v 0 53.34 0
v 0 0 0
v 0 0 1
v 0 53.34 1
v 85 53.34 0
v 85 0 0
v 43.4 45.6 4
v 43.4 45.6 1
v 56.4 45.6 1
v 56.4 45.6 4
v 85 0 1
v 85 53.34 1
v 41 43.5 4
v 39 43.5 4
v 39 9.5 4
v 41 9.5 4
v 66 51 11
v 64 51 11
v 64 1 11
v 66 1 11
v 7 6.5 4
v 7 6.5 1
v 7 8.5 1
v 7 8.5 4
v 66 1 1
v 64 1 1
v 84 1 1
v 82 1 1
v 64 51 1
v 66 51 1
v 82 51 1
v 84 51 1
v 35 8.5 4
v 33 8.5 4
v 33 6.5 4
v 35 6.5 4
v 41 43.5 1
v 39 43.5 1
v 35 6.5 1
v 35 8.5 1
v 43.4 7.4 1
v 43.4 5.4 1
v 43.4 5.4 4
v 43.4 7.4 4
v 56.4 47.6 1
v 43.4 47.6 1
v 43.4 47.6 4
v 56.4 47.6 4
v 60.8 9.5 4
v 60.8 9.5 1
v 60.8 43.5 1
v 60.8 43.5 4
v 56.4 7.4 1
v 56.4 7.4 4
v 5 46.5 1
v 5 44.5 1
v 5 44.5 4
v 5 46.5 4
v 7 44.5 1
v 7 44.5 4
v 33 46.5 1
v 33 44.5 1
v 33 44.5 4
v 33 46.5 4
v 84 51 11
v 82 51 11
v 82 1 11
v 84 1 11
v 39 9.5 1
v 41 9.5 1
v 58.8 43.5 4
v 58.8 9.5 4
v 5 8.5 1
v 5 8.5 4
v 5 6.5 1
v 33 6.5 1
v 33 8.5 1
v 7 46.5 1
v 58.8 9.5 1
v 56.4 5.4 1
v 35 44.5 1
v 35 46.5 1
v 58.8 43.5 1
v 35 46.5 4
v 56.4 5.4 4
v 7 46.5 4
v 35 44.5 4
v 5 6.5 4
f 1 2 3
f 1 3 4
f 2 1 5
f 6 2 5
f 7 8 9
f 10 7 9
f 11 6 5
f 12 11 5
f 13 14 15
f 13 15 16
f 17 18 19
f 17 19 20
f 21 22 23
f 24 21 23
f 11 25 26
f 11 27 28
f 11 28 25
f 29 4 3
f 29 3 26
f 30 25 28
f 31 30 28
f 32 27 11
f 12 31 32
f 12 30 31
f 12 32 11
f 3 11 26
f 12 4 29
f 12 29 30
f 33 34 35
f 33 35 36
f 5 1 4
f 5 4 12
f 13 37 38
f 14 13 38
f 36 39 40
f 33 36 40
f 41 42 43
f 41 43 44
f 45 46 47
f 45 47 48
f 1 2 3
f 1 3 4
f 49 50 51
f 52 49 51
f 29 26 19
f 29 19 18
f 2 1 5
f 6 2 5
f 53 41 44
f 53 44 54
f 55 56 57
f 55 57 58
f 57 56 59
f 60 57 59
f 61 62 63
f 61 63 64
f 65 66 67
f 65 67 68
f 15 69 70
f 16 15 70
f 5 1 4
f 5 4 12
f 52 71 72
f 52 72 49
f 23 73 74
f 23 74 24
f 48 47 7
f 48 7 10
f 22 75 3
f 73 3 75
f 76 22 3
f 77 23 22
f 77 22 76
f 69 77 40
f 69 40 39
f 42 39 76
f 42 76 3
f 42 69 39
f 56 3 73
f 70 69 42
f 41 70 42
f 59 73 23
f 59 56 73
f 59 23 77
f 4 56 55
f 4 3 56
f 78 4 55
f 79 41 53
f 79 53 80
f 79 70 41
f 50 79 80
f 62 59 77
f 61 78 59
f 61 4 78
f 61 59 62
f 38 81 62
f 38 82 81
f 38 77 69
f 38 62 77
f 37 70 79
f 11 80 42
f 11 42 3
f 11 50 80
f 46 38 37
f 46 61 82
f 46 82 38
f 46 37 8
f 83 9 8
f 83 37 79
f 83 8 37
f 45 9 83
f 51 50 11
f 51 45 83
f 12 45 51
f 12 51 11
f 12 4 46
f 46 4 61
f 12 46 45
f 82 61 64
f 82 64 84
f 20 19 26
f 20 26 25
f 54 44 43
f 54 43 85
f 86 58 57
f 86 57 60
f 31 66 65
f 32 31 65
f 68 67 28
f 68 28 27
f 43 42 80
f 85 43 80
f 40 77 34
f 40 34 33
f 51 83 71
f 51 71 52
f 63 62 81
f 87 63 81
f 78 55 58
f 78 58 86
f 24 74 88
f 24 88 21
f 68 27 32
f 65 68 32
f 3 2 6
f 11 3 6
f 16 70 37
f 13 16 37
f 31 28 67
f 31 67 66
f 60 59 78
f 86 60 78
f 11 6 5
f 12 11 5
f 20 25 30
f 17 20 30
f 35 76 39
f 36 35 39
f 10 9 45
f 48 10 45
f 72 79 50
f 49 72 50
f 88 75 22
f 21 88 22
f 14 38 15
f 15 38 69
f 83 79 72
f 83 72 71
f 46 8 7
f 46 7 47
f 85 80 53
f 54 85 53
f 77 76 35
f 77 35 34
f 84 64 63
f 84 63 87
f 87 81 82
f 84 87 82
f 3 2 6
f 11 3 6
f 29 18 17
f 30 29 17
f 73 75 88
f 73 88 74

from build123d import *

# Parameters (mm, degrees)
SKETCH_W      = 85
SKETCH_H      = 53.34
PAD_DEPTH     = 1
SKETCH002_W   = 2
SKETCH002_H   = 50
PAD001_DEPTH  = 10
SKETCH001_W   = 2
SKETCH001_H   = 2
SKETCH001_W_2 = 13
SKETCH001_H_2 = 34
PAD002_DEPTH  = 3


with BuildPart() as pad:
    # Sketch → Pad (new body)
    with BuildSketch(Plane.XY):
        with Locations((42.5, 26.67)):
            Rectangle(SKETCH_W, SKETCH_H)
    extrude(amount=PAD_DEPTH)


with BuildPart() as pad001:
    # Pad001 base: copy of Pad
    add(pad.part)

    # Sketch002 → Pad001 (new body)
    with BuildSketch(Plane.XY.offset(1)):
        with Locations((65, 26)):
            Rectangle(SKETCH002_W, SKETCH002_H)
        with Locations((83, 26)):
            Rectangle(SKETCH002_W, SKETCH002_H)
    extrude(amount=PAD001_DEPTH)


with BuildPart() as pad002:
    # Pad002 base: copy of Pad
    add(pad.part)

    # Sketch001 → Pad002 (new body)
    with BuildSketch(Plane.XY.offset(1)):
        with Locations((6, 45.5)):
            Rectangle(SKETCH001_W, SKETCH001_H)
        with Locations((6, 7.5)):
            Rectangle(SKETCH001_W, SKETCH001_H)
        with Locations((34, 45.5)):
            Rectangle(SKETCH001_W, SKETCH001_H)
        with Locations((34, 7.5)):
            Rectangle(SKETCH001_W, SKETCH001_H)
        with Locations((49.9, 6.4)):
            Rectangle(SKETCH001_W_2, SKETCH001_H)
        with Locations((49.9, 46.6)):
            Rectangle(SKETCH001_W_2, SKETCH001_H)
        Polygon((41, 43.5), (39, 43.5), (39, 9.5), (41, 9.5), (41, 26.5), align=None)
        with Locations((59.8, 26.5)):
            Rectangle(SKETCH001_W, SKETCH001_H_2)
    extrude(amount=PAD002_DEPTH)


solid = Compound([pad001.part, pad002.part])
